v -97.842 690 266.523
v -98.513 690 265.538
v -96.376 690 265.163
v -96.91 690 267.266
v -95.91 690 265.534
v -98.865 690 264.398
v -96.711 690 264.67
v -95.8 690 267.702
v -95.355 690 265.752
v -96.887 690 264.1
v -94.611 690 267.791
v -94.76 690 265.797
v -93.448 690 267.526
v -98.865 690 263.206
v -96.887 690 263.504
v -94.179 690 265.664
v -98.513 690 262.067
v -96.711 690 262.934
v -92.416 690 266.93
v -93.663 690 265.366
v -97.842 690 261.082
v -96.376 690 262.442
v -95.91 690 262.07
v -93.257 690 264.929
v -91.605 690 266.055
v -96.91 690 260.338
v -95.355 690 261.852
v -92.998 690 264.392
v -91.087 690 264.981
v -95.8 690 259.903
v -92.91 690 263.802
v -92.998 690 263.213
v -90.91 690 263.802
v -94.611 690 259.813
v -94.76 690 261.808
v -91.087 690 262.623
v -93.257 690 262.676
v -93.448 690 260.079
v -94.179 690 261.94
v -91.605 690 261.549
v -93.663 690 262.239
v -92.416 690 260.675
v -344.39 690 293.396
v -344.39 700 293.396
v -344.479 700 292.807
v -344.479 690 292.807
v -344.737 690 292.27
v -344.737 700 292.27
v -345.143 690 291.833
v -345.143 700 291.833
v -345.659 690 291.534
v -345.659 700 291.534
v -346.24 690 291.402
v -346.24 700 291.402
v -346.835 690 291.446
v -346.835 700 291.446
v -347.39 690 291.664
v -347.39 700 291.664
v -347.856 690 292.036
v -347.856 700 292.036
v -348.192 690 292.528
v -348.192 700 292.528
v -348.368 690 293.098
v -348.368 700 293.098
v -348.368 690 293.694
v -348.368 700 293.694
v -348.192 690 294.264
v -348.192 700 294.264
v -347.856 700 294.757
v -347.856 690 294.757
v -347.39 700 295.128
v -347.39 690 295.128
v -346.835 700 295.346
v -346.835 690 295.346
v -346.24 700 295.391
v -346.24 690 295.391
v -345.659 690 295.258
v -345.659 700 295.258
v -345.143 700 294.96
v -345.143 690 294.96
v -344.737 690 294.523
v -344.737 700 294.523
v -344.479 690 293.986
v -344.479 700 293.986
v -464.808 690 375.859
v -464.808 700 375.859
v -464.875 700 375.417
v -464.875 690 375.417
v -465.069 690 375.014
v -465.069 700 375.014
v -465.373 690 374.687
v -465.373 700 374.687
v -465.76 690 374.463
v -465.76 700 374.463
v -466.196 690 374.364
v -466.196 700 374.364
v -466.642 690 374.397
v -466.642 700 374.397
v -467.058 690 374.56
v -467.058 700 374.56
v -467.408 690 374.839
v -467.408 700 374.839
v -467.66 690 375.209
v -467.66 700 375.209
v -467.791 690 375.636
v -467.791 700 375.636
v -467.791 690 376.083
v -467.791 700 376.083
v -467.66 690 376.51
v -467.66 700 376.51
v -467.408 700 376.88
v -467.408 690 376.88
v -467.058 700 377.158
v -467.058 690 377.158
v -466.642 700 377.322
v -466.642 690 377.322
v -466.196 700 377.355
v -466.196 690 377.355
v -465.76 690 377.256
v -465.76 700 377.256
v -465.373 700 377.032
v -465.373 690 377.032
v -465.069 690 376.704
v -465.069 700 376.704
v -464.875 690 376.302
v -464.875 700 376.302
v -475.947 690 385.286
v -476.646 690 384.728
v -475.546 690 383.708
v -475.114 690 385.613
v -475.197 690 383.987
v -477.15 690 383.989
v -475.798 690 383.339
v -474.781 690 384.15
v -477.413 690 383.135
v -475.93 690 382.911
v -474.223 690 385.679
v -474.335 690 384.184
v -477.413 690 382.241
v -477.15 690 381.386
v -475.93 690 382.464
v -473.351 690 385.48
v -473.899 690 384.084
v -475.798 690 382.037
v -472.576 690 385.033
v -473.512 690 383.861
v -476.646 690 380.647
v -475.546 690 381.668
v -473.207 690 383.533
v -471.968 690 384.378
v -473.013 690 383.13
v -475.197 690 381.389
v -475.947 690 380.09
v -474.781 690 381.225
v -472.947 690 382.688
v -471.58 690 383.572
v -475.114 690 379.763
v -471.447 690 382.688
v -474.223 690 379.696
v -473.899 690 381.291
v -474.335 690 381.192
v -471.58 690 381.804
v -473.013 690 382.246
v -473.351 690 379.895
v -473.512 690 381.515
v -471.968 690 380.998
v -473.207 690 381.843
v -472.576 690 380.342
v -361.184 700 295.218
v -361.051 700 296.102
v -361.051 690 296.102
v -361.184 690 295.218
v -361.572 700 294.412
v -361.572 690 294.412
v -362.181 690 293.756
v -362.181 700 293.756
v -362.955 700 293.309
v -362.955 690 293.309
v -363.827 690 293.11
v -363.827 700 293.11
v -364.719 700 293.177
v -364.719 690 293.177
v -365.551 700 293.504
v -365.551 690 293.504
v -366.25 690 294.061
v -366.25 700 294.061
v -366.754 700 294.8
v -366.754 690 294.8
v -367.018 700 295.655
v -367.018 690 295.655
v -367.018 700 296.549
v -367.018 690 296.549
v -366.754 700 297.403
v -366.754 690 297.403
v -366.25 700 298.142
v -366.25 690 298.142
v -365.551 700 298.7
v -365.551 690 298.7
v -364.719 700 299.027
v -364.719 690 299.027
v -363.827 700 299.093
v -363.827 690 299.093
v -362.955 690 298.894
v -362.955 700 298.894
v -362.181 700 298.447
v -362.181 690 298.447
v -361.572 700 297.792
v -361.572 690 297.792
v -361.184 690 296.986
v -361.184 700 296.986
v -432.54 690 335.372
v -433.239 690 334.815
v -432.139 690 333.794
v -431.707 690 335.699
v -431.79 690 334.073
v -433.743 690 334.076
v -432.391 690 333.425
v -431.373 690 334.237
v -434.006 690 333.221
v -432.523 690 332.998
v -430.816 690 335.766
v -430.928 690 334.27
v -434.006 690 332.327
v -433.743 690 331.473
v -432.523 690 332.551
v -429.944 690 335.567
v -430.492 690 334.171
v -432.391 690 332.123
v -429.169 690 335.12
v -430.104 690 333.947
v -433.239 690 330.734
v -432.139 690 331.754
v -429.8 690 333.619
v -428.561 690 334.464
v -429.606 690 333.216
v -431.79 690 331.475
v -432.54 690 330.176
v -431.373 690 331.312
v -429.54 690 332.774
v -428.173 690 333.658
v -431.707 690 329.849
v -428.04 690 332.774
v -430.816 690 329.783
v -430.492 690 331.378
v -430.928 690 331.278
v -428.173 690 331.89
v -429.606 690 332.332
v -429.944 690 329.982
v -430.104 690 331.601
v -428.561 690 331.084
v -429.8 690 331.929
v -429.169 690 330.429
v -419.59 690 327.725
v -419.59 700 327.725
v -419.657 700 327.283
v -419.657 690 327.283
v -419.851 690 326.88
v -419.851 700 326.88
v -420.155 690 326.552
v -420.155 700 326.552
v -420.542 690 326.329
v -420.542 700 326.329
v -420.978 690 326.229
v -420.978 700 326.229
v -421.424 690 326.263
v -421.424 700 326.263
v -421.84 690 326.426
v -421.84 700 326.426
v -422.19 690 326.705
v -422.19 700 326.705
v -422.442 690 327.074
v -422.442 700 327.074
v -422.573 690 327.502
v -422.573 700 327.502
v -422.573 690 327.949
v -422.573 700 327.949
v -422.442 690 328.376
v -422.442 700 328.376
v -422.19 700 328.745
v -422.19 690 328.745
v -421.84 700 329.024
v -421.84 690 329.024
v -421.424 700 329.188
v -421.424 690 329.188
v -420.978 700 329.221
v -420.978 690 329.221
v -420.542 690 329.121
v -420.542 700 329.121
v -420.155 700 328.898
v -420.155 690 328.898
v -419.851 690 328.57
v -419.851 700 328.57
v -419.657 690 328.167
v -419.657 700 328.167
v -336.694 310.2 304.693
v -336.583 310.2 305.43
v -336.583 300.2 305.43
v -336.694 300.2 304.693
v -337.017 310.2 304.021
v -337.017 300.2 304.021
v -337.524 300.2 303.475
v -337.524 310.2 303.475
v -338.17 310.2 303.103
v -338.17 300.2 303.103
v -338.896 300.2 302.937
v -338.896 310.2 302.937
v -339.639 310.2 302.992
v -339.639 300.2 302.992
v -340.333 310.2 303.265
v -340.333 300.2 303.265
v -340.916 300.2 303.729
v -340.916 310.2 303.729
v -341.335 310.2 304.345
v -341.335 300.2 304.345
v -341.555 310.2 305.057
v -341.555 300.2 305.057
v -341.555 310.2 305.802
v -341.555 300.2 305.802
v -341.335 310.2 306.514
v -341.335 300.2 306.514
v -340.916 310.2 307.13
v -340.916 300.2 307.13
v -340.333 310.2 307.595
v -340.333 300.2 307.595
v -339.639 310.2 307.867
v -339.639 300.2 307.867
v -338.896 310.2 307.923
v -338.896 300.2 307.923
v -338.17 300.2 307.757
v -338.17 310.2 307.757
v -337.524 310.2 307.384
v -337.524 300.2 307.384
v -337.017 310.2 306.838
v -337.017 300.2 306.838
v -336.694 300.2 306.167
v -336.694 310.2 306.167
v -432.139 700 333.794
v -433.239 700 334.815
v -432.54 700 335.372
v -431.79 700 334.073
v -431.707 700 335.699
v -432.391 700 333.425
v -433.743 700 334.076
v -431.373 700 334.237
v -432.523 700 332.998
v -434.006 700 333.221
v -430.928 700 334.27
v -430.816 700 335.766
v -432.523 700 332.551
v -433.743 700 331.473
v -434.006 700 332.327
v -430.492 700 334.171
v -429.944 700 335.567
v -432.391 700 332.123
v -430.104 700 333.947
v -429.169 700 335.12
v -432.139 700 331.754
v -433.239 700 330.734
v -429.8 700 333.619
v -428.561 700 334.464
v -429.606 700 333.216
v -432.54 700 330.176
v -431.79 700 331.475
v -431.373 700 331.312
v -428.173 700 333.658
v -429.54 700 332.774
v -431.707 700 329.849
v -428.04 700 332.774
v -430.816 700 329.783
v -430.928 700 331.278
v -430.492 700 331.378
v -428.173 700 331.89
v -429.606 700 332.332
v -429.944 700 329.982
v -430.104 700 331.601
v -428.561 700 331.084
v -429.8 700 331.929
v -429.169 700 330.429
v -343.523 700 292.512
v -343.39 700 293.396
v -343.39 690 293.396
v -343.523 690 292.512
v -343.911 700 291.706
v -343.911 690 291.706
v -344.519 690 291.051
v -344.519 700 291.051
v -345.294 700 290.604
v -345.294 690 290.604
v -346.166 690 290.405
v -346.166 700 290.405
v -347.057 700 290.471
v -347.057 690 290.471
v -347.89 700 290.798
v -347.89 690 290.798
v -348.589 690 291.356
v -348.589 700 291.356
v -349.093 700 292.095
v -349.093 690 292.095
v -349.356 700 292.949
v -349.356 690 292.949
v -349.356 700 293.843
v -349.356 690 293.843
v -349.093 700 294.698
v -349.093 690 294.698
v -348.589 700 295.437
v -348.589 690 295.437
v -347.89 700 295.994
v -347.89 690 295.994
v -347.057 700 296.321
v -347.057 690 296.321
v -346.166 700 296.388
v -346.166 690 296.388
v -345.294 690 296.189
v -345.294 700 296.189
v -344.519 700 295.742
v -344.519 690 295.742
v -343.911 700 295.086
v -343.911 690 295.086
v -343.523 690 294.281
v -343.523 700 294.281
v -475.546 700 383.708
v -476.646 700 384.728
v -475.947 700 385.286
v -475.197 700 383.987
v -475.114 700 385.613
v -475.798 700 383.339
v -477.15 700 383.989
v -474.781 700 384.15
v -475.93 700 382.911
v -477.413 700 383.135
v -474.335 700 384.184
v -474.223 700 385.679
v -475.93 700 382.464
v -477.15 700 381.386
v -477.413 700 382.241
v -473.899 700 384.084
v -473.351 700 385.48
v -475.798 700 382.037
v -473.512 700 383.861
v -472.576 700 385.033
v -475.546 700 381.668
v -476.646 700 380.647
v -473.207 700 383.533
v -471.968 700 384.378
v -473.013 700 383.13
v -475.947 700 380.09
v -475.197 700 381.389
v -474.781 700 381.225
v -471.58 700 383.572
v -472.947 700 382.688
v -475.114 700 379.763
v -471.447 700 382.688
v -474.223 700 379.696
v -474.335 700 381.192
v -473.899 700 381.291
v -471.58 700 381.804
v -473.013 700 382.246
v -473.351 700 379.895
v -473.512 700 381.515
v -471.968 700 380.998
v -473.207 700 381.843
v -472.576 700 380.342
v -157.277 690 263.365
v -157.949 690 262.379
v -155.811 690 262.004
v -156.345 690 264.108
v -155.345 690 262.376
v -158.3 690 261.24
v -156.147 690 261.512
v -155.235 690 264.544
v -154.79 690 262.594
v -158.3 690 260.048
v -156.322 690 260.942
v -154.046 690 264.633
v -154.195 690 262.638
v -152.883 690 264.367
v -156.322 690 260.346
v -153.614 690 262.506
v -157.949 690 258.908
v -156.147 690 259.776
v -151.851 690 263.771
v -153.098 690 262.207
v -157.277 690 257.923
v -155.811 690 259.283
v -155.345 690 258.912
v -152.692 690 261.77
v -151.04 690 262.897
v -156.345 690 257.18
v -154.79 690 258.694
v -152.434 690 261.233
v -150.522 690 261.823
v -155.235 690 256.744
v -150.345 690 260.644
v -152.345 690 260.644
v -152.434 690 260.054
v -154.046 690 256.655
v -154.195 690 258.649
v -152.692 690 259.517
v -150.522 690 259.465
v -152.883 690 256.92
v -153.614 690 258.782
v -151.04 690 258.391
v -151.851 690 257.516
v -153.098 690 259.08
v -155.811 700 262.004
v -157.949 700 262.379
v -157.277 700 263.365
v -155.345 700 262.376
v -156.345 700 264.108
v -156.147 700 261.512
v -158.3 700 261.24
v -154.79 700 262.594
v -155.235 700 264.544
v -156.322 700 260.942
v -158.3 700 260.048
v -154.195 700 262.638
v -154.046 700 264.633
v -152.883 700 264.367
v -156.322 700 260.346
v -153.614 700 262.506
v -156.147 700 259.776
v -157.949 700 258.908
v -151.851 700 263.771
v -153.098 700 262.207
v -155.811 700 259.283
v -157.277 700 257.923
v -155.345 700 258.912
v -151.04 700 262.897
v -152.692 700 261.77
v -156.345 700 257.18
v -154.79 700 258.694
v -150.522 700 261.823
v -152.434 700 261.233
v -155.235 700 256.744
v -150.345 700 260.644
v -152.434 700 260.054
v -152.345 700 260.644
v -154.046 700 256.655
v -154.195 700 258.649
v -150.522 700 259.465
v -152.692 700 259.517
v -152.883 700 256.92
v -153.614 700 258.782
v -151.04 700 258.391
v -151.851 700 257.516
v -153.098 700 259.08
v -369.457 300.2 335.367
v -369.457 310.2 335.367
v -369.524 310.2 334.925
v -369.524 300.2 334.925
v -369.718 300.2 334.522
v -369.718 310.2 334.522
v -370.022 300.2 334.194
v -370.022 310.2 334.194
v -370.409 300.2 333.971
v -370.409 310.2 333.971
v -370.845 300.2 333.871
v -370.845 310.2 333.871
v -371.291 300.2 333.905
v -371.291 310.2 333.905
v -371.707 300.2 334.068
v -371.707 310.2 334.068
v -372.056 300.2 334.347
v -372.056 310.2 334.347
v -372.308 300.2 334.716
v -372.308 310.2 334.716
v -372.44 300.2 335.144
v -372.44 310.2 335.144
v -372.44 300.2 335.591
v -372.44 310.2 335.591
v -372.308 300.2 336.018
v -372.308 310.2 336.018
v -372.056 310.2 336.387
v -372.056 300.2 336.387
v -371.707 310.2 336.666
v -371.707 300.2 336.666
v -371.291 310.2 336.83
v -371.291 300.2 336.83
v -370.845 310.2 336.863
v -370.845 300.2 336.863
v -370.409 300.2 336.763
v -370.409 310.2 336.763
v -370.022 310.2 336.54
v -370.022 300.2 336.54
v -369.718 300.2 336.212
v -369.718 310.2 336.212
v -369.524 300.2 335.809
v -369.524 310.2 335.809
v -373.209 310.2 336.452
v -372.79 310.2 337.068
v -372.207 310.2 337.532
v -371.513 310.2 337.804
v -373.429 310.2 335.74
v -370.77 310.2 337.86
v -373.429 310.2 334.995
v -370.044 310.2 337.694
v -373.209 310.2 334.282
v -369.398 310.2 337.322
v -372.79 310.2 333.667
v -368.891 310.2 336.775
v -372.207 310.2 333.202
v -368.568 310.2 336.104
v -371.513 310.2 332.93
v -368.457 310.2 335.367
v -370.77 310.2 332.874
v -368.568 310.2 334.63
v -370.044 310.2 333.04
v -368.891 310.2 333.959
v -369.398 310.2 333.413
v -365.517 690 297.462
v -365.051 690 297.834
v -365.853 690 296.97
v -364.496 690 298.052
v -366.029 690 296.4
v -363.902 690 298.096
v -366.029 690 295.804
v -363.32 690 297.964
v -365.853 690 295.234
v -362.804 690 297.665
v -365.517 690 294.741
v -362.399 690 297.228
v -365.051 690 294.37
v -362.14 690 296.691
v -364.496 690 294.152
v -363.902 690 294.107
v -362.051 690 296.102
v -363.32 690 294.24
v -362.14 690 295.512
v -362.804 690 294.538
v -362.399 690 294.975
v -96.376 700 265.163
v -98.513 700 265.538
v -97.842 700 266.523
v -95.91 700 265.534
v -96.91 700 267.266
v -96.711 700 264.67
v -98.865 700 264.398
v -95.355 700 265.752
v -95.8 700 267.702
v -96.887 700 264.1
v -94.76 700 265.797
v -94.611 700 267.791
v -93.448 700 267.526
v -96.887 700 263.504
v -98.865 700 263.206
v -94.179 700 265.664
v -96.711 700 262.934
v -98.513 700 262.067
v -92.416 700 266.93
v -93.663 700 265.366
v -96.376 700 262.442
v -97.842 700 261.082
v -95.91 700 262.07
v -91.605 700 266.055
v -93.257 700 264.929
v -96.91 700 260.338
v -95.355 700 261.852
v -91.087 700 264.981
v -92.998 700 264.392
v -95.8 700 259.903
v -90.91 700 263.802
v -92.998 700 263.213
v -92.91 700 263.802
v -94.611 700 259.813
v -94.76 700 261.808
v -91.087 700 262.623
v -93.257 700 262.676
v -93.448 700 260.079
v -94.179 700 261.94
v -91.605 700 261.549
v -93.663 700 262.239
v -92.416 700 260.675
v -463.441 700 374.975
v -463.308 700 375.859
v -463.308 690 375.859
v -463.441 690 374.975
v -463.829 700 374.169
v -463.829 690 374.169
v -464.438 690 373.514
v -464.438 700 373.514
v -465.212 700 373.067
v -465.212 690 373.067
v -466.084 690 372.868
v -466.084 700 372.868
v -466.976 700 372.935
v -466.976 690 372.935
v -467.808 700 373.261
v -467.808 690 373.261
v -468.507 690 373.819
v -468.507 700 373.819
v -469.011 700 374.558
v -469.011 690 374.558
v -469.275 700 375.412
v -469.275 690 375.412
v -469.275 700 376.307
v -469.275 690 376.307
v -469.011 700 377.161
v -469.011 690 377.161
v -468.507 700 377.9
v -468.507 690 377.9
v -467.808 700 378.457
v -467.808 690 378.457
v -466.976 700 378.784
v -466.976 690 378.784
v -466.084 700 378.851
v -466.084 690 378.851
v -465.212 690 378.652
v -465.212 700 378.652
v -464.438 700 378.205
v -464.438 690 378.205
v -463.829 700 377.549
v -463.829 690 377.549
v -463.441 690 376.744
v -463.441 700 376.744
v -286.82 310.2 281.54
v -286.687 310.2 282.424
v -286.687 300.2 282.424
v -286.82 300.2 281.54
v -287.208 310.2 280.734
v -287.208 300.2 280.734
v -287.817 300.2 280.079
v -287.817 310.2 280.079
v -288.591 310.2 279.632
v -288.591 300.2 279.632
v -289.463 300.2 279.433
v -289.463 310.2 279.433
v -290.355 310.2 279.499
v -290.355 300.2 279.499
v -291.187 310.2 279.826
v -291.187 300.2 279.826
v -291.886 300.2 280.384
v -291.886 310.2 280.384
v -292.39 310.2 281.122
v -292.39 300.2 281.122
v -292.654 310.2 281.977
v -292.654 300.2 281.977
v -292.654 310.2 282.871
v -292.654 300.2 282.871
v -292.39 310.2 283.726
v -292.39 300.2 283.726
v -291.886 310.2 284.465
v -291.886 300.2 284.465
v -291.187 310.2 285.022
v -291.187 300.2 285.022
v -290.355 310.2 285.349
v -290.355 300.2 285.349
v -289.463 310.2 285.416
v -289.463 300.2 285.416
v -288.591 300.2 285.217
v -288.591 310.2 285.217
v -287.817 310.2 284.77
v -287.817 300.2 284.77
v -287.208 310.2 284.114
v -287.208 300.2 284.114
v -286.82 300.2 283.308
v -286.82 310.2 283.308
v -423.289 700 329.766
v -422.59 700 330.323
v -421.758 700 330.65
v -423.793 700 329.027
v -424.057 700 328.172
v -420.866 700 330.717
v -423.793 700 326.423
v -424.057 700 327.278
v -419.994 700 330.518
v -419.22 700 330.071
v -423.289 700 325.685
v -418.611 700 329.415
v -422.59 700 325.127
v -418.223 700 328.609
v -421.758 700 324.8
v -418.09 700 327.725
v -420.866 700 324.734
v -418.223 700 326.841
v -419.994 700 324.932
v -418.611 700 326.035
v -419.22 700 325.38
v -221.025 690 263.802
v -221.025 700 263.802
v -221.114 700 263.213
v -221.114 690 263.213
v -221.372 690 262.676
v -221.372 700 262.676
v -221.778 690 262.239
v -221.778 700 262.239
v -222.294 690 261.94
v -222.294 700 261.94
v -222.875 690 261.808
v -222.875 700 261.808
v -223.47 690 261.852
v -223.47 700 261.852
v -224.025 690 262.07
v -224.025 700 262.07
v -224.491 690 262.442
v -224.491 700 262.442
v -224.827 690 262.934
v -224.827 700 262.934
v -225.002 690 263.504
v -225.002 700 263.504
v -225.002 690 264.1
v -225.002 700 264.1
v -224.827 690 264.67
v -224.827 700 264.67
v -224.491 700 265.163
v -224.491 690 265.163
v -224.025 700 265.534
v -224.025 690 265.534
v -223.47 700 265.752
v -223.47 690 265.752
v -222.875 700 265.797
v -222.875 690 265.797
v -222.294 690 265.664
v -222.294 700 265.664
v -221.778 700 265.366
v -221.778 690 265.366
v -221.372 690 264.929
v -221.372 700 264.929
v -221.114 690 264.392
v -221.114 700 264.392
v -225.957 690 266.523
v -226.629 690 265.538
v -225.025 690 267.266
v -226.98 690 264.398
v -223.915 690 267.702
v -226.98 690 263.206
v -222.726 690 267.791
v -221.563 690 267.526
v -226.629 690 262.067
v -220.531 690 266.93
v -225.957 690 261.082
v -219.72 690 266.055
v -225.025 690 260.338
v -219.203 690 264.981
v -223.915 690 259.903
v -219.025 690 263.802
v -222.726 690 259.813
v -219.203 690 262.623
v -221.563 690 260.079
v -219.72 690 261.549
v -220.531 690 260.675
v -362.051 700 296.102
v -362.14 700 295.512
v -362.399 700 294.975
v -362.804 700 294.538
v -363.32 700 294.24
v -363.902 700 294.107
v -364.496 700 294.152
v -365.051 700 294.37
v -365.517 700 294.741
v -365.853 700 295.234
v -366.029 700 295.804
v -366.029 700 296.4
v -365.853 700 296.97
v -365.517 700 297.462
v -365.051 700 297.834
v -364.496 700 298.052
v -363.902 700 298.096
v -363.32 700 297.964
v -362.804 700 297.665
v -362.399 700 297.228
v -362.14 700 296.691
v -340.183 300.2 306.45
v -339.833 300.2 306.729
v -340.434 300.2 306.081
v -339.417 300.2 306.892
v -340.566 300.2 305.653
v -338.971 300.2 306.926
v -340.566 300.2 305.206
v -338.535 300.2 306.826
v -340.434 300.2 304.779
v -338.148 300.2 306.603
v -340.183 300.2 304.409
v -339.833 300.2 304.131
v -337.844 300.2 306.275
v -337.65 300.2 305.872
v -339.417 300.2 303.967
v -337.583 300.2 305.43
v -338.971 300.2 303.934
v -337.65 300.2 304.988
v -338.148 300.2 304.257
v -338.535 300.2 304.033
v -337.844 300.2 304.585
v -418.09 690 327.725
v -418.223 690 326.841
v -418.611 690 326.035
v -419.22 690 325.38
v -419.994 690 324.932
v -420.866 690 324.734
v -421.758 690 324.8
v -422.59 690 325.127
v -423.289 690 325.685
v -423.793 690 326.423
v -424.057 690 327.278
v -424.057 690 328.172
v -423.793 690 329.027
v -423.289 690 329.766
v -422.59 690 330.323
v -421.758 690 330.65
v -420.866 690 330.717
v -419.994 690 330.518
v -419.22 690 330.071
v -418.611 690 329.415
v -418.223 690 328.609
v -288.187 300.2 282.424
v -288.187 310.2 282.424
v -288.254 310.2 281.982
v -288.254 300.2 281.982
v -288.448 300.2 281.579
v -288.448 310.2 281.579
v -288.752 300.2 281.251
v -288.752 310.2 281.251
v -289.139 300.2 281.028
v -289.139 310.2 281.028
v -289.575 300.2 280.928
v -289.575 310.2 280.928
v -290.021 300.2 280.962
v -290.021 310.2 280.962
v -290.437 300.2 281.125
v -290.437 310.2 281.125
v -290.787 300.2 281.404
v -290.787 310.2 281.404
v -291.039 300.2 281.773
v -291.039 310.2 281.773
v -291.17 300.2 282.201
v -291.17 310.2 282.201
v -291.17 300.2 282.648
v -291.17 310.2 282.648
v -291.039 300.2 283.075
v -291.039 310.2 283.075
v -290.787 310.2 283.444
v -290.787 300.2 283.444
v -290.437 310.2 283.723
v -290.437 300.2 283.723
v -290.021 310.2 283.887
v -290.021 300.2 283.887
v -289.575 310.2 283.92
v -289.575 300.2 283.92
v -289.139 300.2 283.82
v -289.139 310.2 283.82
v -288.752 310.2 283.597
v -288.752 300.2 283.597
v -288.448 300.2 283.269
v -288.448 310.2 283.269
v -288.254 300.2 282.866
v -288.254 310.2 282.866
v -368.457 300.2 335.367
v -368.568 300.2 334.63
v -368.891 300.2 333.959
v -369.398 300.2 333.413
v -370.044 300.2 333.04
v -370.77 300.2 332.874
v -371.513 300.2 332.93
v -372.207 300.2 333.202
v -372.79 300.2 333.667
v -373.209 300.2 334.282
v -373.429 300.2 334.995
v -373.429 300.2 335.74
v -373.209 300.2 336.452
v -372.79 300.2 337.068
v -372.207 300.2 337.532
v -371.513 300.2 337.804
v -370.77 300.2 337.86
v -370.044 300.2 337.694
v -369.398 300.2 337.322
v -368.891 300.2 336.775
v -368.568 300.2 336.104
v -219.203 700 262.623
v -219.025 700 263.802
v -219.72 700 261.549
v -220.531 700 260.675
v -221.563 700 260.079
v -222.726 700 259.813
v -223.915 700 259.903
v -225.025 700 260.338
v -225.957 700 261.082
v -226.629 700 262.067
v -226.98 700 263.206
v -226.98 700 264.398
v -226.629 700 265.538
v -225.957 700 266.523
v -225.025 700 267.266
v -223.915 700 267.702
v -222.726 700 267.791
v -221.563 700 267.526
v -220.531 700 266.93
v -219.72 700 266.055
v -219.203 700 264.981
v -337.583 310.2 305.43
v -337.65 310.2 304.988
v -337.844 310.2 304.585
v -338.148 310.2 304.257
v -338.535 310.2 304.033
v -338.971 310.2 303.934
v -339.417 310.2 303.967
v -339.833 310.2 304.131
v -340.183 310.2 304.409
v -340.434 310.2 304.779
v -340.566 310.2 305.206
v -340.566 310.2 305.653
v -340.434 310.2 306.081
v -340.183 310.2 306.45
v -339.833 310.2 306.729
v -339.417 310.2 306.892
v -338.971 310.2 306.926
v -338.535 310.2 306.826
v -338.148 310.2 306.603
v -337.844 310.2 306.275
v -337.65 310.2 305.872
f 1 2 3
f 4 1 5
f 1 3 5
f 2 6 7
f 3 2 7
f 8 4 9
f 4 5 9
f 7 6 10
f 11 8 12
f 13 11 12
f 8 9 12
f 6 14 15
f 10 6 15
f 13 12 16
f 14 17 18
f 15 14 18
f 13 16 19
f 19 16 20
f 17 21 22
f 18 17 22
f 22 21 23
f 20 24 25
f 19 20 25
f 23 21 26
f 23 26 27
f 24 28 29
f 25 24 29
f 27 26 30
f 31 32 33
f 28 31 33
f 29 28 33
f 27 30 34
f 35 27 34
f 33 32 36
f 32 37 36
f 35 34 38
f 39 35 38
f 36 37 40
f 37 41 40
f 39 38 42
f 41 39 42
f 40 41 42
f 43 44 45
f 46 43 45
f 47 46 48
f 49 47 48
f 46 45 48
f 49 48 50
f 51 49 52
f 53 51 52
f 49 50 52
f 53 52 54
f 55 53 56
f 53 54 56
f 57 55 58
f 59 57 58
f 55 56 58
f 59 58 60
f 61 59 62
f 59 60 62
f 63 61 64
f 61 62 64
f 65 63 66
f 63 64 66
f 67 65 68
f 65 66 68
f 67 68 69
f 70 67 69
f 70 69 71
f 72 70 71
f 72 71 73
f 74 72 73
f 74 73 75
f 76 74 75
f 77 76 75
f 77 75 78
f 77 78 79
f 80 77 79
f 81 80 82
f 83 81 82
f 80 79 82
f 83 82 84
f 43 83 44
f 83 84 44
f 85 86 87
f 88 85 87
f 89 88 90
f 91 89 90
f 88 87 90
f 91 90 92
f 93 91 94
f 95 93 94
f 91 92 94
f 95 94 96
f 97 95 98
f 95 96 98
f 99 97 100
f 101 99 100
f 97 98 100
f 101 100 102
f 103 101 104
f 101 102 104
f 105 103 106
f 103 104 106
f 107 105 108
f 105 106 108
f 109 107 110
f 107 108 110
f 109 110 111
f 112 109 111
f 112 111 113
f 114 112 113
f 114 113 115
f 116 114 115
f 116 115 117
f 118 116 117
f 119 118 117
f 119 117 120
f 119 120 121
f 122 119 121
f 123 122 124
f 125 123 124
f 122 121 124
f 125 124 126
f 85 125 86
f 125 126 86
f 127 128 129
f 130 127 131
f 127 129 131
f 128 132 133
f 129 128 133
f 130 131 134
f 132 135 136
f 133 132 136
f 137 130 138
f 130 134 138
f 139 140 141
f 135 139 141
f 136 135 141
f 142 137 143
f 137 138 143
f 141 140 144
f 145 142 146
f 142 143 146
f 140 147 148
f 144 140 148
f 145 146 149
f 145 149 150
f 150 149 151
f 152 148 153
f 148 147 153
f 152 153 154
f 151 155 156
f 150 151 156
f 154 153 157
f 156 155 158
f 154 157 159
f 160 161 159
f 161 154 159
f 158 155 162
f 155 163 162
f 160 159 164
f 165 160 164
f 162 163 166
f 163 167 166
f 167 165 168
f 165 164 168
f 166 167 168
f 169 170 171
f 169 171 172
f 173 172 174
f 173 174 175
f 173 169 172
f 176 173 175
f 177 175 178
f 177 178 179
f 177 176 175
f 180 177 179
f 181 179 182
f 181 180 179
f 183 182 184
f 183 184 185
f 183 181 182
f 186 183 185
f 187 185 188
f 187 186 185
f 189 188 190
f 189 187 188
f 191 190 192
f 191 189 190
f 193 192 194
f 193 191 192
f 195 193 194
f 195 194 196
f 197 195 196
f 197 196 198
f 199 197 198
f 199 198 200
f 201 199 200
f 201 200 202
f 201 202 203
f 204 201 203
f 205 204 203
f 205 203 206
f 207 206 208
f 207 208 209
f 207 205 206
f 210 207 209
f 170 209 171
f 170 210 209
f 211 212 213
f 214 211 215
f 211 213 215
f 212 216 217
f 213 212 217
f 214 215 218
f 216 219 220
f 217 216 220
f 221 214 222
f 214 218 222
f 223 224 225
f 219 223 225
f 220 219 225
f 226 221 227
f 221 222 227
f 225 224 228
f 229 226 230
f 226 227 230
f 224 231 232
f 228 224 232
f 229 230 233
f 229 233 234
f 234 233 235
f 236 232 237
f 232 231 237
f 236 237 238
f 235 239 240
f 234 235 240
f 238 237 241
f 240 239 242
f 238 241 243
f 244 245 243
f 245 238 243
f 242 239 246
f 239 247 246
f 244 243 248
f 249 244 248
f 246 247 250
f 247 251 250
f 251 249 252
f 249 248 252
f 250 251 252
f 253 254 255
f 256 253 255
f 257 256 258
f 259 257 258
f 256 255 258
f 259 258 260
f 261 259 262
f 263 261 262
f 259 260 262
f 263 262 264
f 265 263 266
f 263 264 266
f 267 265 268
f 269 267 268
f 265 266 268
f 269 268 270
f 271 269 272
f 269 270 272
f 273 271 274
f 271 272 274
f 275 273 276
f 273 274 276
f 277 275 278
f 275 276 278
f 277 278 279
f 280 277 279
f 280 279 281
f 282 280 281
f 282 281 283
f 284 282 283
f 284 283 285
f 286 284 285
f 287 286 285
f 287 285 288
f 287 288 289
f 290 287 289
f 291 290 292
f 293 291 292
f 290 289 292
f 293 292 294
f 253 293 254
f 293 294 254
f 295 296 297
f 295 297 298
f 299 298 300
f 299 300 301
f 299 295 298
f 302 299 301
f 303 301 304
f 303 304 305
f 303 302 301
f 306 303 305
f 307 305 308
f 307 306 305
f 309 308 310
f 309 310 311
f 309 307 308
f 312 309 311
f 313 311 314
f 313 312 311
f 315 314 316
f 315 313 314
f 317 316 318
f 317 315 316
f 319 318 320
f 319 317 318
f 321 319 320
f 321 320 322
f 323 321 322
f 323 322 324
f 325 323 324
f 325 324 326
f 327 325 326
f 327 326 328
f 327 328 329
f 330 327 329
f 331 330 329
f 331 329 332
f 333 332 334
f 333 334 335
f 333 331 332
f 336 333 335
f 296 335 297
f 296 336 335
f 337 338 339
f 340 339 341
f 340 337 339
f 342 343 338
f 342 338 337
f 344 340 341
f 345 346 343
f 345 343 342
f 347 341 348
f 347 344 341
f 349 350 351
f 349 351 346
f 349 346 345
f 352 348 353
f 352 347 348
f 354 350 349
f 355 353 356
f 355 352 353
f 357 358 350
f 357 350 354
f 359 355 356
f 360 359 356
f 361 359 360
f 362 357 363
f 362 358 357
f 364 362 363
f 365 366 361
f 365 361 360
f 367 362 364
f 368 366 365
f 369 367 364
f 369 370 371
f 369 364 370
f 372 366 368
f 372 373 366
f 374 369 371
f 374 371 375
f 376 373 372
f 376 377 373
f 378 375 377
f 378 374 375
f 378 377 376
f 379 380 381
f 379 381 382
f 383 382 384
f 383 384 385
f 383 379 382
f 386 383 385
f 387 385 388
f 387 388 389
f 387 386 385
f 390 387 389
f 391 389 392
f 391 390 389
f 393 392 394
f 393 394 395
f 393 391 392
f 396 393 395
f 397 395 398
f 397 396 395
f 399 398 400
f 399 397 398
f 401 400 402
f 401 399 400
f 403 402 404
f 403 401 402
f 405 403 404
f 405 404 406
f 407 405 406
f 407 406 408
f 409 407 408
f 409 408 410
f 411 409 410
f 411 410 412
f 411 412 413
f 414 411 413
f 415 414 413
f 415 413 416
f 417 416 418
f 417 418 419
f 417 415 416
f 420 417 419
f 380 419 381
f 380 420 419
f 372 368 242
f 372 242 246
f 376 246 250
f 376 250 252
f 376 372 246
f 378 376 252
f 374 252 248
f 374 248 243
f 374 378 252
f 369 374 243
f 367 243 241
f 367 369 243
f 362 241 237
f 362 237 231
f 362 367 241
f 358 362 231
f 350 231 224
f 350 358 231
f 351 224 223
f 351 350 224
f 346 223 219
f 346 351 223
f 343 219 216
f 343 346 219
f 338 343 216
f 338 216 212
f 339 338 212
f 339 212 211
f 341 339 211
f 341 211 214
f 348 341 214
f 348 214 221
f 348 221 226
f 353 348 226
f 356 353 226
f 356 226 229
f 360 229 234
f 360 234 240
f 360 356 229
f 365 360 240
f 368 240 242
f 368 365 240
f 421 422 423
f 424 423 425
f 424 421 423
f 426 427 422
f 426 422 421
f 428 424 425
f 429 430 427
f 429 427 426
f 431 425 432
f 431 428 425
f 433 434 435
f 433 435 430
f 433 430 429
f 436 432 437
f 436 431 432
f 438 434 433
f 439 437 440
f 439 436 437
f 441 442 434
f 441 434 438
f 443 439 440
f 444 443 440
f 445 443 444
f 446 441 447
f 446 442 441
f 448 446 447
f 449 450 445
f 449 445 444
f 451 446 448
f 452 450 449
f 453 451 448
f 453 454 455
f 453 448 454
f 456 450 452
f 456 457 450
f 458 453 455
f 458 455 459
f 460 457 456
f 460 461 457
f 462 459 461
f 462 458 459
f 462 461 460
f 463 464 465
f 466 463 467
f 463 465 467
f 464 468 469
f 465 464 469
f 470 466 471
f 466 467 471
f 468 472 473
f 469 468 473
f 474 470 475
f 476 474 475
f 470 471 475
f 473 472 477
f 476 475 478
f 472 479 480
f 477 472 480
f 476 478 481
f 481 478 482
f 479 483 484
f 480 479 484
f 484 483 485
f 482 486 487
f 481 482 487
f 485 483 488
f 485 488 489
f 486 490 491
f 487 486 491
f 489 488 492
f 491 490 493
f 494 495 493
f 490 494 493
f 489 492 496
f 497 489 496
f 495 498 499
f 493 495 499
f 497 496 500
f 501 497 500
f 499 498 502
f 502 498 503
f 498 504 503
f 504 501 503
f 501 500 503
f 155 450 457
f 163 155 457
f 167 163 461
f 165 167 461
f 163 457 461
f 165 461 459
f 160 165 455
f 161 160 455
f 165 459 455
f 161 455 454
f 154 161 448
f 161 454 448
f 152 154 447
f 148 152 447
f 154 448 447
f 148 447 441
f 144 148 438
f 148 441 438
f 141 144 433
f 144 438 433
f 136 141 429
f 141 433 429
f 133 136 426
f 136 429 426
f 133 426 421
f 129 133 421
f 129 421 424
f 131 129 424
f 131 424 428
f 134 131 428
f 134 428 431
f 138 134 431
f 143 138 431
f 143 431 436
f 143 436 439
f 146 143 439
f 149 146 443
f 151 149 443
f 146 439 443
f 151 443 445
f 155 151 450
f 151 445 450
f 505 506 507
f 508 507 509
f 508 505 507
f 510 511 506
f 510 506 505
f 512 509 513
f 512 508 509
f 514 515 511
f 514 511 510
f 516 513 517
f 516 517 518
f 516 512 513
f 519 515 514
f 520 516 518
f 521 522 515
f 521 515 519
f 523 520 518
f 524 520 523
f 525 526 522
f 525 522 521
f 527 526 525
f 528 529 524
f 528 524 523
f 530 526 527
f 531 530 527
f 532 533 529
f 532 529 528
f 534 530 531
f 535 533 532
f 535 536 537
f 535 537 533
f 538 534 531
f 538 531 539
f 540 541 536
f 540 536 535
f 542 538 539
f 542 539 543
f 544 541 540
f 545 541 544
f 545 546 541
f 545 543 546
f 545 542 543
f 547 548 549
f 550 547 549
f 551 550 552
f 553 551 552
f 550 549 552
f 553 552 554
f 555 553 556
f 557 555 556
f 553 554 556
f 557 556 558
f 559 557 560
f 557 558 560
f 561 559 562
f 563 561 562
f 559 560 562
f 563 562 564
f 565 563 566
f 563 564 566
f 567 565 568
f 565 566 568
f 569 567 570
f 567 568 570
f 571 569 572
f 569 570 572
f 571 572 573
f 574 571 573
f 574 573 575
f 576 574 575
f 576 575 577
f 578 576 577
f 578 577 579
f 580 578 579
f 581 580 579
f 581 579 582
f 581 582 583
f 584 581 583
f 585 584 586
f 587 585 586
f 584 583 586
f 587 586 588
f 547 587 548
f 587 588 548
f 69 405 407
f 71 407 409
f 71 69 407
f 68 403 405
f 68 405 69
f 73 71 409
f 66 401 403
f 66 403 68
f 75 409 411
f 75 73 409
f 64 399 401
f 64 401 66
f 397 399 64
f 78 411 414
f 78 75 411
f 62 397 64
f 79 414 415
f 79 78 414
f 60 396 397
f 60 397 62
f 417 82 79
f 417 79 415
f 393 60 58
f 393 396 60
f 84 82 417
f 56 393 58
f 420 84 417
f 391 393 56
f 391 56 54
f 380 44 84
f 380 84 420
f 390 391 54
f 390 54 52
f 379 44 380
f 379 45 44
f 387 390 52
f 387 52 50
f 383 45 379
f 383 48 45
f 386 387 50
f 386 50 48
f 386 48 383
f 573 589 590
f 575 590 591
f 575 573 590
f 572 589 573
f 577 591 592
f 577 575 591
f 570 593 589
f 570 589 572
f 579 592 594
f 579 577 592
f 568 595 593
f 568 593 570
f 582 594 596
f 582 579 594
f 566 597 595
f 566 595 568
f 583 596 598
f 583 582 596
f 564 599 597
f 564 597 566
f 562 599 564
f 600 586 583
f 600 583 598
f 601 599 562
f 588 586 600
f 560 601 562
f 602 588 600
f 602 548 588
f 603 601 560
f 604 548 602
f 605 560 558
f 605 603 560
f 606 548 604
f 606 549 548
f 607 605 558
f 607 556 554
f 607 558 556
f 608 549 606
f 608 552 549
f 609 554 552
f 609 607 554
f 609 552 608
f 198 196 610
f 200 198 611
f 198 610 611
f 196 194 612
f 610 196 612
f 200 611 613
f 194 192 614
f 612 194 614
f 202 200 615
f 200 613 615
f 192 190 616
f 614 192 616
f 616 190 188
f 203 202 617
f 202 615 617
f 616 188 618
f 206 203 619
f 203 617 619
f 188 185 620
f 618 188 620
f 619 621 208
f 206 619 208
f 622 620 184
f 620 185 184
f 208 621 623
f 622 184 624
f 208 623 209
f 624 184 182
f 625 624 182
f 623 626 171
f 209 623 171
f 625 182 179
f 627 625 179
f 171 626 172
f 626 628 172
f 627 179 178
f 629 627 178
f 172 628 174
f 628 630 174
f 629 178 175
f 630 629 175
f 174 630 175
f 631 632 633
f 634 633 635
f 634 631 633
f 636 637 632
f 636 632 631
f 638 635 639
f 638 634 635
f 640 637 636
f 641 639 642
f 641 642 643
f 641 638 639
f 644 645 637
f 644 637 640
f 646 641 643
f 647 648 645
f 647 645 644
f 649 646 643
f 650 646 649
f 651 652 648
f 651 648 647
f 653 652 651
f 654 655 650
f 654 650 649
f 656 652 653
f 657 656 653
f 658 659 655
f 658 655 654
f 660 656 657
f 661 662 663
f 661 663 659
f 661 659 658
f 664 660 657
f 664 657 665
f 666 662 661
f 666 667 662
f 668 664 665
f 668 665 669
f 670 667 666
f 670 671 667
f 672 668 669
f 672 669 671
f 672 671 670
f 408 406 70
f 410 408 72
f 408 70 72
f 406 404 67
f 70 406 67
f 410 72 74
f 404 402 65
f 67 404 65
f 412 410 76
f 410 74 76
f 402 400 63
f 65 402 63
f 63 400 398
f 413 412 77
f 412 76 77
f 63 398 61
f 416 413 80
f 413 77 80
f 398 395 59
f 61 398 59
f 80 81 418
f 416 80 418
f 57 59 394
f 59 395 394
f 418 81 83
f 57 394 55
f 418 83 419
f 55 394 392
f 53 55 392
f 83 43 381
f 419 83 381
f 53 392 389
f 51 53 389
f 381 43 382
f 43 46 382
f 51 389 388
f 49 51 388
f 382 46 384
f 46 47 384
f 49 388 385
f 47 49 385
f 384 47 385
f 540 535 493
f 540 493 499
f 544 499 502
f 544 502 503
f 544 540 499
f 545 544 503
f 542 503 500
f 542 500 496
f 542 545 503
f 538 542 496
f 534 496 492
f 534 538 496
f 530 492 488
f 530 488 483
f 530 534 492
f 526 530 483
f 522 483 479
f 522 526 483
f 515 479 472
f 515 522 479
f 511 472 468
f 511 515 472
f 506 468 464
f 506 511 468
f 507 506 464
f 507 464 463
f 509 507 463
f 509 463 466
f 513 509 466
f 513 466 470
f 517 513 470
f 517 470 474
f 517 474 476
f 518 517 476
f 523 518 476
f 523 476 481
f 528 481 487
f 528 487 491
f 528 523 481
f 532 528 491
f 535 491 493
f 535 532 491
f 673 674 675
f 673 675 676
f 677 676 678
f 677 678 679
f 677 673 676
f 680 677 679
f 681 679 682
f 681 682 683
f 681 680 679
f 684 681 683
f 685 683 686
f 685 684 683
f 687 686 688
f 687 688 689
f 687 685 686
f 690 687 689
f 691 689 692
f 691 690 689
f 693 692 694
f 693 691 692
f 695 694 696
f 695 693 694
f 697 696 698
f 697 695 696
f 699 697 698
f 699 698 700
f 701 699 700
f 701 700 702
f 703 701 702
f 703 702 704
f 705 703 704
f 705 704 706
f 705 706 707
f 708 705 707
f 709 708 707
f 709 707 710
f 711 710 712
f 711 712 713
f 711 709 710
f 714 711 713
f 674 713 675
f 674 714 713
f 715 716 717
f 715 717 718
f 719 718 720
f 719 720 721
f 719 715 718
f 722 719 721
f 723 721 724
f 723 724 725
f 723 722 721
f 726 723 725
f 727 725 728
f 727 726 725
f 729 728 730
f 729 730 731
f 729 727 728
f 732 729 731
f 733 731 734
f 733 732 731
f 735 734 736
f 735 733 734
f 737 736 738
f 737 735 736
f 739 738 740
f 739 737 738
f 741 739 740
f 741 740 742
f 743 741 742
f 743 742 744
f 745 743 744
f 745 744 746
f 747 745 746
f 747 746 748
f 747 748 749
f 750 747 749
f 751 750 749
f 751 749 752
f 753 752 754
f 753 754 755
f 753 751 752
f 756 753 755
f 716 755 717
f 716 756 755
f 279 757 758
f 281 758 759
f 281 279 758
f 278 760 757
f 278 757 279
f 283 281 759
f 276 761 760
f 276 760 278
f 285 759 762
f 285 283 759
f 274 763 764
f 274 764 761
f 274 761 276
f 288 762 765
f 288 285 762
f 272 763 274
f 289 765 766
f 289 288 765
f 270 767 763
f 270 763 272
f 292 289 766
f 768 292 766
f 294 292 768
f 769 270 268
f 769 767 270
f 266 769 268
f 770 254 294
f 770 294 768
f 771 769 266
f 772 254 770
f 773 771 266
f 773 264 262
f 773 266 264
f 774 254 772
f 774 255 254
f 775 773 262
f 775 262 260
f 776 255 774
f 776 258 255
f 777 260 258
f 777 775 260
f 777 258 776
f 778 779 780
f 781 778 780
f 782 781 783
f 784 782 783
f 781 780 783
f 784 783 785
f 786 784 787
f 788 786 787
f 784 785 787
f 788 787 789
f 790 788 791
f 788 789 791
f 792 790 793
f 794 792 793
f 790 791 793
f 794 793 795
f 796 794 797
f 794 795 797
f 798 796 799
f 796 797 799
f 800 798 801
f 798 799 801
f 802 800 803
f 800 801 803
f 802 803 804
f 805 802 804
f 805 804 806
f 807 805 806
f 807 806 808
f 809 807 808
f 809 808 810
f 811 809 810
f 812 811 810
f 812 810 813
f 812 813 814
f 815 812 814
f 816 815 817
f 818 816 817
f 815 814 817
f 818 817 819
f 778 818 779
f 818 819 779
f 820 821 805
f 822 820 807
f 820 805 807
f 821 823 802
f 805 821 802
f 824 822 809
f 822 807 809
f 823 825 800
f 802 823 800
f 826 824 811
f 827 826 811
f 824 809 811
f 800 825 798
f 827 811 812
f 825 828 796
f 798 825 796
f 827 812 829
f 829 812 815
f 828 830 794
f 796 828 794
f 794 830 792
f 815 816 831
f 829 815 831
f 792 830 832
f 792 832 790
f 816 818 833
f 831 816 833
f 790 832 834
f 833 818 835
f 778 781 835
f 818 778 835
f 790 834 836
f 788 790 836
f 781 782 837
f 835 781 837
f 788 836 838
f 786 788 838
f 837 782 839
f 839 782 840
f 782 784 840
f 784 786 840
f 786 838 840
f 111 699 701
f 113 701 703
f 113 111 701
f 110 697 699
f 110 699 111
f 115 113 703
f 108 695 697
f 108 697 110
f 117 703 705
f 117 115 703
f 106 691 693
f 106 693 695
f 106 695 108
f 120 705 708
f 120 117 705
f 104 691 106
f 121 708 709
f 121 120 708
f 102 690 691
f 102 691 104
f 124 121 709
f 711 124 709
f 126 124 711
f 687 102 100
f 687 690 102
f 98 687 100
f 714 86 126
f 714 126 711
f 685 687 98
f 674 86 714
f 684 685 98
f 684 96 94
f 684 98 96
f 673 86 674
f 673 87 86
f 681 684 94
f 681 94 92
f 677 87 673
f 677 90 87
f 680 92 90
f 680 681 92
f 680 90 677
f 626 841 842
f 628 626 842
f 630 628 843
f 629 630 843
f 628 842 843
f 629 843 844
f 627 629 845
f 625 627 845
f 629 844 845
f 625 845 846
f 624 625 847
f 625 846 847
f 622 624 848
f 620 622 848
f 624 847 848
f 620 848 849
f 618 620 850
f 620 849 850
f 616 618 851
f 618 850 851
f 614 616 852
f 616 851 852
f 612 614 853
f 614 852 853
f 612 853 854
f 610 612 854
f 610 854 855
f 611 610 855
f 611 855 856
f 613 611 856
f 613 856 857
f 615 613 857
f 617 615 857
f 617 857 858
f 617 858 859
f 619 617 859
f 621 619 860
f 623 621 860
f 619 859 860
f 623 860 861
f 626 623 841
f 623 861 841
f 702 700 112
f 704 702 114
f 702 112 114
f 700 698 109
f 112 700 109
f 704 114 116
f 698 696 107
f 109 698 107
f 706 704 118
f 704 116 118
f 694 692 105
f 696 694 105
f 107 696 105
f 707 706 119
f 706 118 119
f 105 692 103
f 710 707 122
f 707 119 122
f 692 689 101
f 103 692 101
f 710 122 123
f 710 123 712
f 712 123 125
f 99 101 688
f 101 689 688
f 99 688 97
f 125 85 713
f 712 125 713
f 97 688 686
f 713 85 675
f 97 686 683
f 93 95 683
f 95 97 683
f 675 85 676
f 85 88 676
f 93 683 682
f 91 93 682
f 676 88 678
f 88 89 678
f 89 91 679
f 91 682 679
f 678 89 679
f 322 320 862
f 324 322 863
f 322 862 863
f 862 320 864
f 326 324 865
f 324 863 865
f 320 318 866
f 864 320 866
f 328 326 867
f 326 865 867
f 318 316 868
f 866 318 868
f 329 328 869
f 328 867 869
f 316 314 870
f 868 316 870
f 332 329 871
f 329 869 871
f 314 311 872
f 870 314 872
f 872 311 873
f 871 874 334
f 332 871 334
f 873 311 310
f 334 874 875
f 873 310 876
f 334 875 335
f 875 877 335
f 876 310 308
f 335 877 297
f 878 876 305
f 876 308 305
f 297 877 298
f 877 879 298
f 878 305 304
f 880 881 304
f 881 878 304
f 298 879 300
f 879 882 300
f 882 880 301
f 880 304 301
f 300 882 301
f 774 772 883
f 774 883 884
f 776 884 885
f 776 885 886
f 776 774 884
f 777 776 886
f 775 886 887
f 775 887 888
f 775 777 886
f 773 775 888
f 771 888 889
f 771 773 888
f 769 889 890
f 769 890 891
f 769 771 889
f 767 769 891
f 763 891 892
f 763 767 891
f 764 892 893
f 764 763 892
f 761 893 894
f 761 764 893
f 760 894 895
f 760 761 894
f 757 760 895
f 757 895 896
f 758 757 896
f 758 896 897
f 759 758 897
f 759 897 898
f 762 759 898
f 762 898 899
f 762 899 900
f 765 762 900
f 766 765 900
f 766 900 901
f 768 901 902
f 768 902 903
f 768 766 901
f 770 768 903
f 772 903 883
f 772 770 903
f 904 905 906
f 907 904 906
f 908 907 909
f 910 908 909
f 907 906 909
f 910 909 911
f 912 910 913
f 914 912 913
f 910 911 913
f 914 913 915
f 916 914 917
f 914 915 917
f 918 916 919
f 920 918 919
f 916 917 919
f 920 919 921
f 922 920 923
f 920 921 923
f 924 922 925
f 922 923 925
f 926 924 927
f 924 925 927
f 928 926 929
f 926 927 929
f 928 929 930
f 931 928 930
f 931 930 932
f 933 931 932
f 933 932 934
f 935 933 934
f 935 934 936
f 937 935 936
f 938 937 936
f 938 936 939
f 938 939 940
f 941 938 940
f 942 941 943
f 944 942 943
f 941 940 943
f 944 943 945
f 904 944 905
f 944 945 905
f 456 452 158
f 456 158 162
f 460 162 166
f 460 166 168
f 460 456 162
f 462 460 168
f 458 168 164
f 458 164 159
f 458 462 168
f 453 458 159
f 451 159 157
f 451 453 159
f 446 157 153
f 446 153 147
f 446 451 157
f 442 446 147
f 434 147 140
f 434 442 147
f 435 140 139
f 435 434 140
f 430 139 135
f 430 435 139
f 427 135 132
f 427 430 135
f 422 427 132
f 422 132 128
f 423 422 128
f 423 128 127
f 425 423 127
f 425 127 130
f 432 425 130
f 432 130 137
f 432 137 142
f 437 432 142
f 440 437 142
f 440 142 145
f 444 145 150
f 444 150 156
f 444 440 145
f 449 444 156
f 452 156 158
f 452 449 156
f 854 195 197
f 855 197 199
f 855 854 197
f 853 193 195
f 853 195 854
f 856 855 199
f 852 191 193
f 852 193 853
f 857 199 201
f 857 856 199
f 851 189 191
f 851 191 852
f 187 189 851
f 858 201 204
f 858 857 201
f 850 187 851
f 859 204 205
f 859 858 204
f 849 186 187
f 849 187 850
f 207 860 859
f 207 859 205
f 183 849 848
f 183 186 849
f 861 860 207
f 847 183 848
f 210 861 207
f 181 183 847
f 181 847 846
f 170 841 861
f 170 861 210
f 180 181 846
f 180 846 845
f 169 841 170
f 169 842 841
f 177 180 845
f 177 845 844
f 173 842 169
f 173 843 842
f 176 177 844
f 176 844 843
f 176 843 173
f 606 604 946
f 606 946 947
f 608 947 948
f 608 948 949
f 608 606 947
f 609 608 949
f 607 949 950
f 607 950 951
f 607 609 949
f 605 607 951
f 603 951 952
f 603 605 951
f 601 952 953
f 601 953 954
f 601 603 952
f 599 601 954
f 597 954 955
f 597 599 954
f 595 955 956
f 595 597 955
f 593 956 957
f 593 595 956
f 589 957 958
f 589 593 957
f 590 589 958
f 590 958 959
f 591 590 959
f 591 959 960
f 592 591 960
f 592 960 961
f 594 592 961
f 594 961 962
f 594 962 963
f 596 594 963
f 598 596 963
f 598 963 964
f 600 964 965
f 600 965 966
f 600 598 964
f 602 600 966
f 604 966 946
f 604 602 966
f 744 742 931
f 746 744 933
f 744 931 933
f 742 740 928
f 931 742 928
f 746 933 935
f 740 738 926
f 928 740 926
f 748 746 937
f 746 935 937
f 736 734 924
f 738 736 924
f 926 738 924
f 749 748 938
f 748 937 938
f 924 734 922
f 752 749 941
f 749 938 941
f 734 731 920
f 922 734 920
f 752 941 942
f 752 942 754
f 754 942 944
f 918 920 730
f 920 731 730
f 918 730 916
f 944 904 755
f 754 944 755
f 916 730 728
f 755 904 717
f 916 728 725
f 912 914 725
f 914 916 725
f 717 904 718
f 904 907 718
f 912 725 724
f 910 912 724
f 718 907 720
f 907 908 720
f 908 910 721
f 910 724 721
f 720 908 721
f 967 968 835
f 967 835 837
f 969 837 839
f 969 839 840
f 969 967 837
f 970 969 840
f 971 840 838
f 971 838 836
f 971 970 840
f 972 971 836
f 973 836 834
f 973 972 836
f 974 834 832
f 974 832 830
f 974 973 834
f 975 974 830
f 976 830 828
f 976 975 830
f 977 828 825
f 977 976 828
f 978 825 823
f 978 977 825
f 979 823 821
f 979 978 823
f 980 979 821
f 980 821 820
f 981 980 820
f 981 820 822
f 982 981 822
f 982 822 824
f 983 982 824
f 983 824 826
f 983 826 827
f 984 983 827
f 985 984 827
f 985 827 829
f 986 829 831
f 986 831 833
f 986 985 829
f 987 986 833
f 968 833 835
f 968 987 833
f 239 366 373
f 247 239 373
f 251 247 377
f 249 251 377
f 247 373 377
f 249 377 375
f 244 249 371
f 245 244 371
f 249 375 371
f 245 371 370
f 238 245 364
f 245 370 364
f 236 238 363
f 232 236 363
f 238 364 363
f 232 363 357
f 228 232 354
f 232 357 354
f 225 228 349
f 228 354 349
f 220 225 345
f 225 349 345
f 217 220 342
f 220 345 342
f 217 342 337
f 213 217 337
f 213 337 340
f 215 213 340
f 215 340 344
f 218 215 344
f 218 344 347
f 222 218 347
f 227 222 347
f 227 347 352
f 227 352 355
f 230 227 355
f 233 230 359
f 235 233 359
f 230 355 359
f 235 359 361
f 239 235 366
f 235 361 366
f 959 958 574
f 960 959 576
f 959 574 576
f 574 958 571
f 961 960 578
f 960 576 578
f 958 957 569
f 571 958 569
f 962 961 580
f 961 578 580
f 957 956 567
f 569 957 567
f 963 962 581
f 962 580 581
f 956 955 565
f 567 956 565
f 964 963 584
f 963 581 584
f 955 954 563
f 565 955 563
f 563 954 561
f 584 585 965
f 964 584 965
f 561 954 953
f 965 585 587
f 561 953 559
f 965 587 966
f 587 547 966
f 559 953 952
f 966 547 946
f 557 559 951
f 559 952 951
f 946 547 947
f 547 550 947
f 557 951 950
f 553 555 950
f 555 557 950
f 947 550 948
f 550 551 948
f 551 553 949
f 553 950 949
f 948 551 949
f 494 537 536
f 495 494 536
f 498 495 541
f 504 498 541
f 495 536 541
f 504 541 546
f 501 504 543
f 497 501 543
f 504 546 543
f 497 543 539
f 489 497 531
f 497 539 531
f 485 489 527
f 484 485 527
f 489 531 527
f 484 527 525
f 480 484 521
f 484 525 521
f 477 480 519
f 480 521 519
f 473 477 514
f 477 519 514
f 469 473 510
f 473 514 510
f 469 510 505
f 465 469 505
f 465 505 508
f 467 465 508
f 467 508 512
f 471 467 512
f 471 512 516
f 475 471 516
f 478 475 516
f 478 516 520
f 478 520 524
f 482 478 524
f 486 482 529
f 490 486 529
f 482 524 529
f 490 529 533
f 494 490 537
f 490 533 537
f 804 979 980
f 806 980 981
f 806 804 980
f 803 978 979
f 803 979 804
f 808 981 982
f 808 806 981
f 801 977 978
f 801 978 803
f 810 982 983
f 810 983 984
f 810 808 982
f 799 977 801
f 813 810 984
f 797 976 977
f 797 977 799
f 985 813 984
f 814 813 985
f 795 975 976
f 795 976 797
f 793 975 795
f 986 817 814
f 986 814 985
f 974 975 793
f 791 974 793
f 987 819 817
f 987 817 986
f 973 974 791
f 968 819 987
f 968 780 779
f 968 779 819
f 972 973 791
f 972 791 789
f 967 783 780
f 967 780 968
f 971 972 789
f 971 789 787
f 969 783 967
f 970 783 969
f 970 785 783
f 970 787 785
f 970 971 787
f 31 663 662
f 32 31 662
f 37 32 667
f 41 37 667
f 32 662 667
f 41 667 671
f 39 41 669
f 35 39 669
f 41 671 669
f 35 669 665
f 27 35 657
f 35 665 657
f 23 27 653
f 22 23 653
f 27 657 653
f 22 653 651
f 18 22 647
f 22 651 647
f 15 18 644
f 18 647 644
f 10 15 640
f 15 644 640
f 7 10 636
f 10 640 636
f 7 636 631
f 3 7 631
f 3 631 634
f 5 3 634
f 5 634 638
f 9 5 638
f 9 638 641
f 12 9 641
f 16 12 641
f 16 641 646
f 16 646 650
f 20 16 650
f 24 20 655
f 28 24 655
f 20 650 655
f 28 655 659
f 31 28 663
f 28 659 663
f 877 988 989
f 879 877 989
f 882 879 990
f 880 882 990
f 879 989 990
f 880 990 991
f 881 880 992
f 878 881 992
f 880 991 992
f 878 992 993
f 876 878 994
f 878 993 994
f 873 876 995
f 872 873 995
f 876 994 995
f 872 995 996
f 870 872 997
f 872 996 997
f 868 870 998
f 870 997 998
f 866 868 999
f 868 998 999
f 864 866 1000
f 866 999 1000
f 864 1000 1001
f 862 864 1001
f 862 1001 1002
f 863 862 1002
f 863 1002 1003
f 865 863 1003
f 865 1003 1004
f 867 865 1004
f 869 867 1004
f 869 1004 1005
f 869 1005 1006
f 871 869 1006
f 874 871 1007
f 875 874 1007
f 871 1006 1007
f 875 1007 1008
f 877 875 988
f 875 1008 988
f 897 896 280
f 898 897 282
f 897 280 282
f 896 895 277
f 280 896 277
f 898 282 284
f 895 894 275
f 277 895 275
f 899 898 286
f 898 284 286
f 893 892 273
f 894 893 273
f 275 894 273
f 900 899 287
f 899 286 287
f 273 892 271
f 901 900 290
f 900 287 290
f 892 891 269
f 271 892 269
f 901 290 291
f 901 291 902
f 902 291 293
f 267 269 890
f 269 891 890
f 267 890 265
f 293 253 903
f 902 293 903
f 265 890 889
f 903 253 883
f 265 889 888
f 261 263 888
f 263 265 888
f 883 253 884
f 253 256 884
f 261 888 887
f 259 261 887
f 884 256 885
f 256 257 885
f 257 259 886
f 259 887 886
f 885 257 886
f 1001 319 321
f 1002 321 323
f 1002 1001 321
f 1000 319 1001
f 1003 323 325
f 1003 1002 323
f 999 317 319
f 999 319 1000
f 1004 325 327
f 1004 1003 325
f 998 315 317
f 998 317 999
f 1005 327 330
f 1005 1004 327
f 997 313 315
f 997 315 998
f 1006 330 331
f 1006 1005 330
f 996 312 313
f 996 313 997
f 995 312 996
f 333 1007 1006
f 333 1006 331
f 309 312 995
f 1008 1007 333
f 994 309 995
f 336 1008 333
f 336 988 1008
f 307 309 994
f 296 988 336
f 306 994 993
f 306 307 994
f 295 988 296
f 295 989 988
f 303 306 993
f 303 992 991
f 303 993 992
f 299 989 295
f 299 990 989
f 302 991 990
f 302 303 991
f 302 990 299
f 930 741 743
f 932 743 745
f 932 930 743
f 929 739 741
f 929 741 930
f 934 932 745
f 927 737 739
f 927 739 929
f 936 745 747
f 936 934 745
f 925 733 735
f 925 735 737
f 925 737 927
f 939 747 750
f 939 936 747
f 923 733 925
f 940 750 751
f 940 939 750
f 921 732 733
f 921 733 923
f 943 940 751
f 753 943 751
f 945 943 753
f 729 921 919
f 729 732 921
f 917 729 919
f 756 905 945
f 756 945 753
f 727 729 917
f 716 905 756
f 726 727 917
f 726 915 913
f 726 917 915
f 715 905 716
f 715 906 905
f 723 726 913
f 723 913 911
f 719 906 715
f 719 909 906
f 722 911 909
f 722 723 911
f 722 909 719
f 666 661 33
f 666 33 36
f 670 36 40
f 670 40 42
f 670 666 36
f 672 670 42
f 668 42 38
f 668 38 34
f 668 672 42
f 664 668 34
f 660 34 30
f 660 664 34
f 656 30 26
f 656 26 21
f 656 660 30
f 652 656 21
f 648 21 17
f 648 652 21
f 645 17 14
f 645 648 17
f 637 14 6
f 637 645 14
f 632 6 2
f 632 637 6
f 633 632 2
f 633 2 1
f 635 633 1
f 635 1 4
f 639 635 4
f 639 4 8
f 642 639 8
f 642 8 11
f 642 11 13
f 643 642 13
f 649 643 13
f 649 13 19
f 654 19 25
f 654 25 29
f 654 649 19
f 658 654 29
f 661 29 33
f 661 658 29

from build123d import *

# Parameters (mm, degrees)
SZKIC1_R                      = 3
SZKIC1_R_2                    = 1.5
DODANIE_WYCI_GNI_CIE1_DEPTH   = 10
DODANIE_WYCI_GNI_CIE1_2_DEPTH = 10
DODANIE_WYCI_GNI_CIE1_3_DEPTH = 10
DODANIE_WYCI_GNI_CIE1_4_DEPTH = 10
SZKIC1_R_3                    = 2
DODANIE_WYCI_GNI_CIE1_5_DEPTH = 10
DODANIE_WYCI_GNI_CIE1_6_DEPTH = 10
SZKIC1_R_4                    = 4
DODANIE_WYCI_GNI_CIE1_7_DEPTH = 10
DODANIE_WYCI_GNI_CIE1_8_DEPTH = 10
DODANIE_WYCI_GNI_CIE1_9_DEPTH = 10
SZKIC2_R                      = 2.5
SZKIC2_R_2                    = 1.5
DODANIE_WYCI_GNI_CIE2_DEPTH   = 10
DODANIE_WYCI_GNI_CIE2_2_DEPTH = 10
SZKIC2_R_3                    = 3
DODANIE_WYCI_GNI_CIE2_3_DEPTH = 10


with BuildPart() as part:
    # Szkic1 → Dodanie-wyciągnięcie1 (new body)
    with BuildSketch(Plane(origin=(0, 700, 0), x_dir=(1, 0, 0), z_dir=(0, 1, 0))):
        with Locations((-474.446759549, -382.68779999)):
            Circle(SZKIC1_R)
        with Locations((-474.446759549, -382.68779999)):
            Circle(SZKIC1_R_2, mode=Mode.SUBTRACT)
    extrude(amount=-DODANIE_WYCI_GNI_CIE1_DEPTH)


with BuildPart() as body_2:
    # Szkic1 → Dodanie-wyci_gni_cie1 2 (new body)
    with BuildSketch(Plane(origin=(0, 700, 0), x_dir=(1, 0, 0), z_dir=(0, 1, 0))):
        with Locations((-466.308050674, -375.85941501)):
            Circle(SZKIC1_R)
        with Locations((-466.308050674, -375.85941501)):
            Circle(SZKIC1_R_2, mode=Mode.SUBTRACT)
    extrude(amount=-DODANIE_WYCI_GNI_CIE1_2_DEPTH)


with BuildPart() as body_3:
    # Szkic1 → Dodanie-wyci_gni_cie1 3 (new body)
    with BuildSketch(Plane(origin=(0, 700, 0), x_dir=(1, 0, 0), z_dir=(0, 1, 0))):
        with Locations((-431.039698402, -332.774189517)):
            Circle(SZKIC1_R)
        with Locations((-431.039698402, -332.774189517)):
            Circle(SZKIC1_R_2, mode=Mode.SUBTRACT)
    extrude(amount=-DODANIE_WYCI_GNI_CIE1_3_DEPTH)


with BuildPart() as body_4:
    # Szkic1 → Dodanie-wyci_gni_cie1 4 (new body)
    with BuildSketch(Plane(origin=(0, 700, 0), x_dir=(1, 0, 0), z_dir=(0, 1, 0))):
        with Locations((-421.090050281, -327.725114352)):
            Circle(SZKIC1_R)
        with Locations((-421.090050281, -327.725114352)):
            Circle(SZKIC1_R_2, mode=Mode.SUBTRACT)
    extrude(amount=-DODANIE_WYCI_GNI_CIE1_4_DEPTH)


with BuildPart() as body_5:
    # Szkic1 → Dodanie-wyci_gni_cie1 5 (new body)
    with BuildSketch(Plane(origin=(0, 700, 0), x_dir=(1, 0, 0), z_dir=(0, 1, 0))):
        with Locations((-364.051137421, -296.101801859)):
            Circle(SZKIC1_R)
        with Locations((-364.051137421, -296.101801859)):
            Circle(SZKIC1_R_3, mode=Mode.SUBTRACT)
    extrude(amount=-DODANIE_WYCI_GNI_CIE1_5_DEPTH)


with BuildPart() as body_6:
    # Szkic1 → Dodanie-wyci_gni_cie1 6 (new body)
    with BuildSketch(Plane(origin=(0, 700, 0), x_dir=(1, 0, 0), z_dir=(0, 1, 0))):
        with Locations((-346.389872513, -293.396246383)):
            Circle(SZKIC1_R)
        with Locations((-346.389872513, -293.396246383)):
            Circle(SZKIC1_R_3, mode=Mode.SUBTRACT)
    extrude(amount=-DODANIE_WYCI_GNI_CIE1_6_DEPTH)


with BuildPart() as body_7:
    # Szkic1 → Dodanie-wyci_gni_cie1 7 (new body)
    with BuildSketch(Plane(origin=(0, 700, 0), x_dir=(1, 0, 0), z_dir=(0, 1, 0))):
        with Locations((-223.024834581, -263.802212936)):
            Circle(SZKIC1_R_4)
        with Locations((-223.024834581, -263.802212936)):
            Circle(SZKIC1_R_3, mode=Mode.SUBTRACT)
    extrude(amount=-DODANIE_WYCI_GNI_CIE1_7_DEPTH)


with BuildPart() as body_8:
    # Szkic1 → Dodanie-wyci_gni_cie1 8 (new body)
    with BuildSketch(Plane(origin=(0, 700, 0), x_dir=(1, 0, 0), z_dir=(0, 1, 0))):
        with Locations((-154.344703344, -260.643821632)):
            Circle(SZKIC1_R_4)
        with Locations((-154.344703344, -260.643821632)):
            Circle(SZKIC1_R_3, mode=Mode.SUBTRACT)
    extrude(amount=-DODANIE_WYCI_GNI_CIE1_8_DEPTH)


with BuildPart() as body_9:
    # Szkic1 → Dodanie-wyci_gni_cie1 9 (new body)
    with BuildSketch(Plane(origin=(0, 700, 0), x_dir=(1, 0, 0), z_dir=(0, 1, 0))):
        with Locations((-94.909521544, -263.802212936)):
            Circle(SZKIC1_R_4)
        with Locations((-94.909521544, -263.802212936)):
            Circle(SZKIC1_R_3, mode=Mode.SUBTRACT)
    extrude(amount=-DODANIE_WYCI_GNI_CIE1_9_DEPTH)


with BuildPart() as body_10:
    # Szkic2 → Dodanie-wyciągnięcie2 (new body)
    with BuildSketch(Plane(origin=(0, 310.2, 0), x_dir=(1, 0, 0), z_dir=(0, 1, 0))):
        with Locations((-370.956911026, -335.367132453)):
            Circle(SZKIC2_R)
        with Locations((-370.956911026, -335.367132453)):
            Circle(SZKIC2_R_2, mode=Mode.SUBTRACT)
    extrude(amount=-DODANIE_WYCI_GNI_CIE2_DEPTH)


with BuildPart() as body_11:
    # Szkic2 → Dodanie-wyci_gni_cie2 2 (new body)
    with BuildSketch(Plane(origin=(0, 310.2, 0), x_dir=(1, 0, 0), z_dir=(0, 1, 0))):
        with Locations((-339.082998521, -305.429754446)):
            Circle(SZKIC2_R)
        with Locations((-339.082998521, -305.429754446)):
            Circle(SZKIC2_R_2, mode=Mode.SUBTRACT)
    extrude(amount=-DODANIE_WYCI_GNI_CIE2_2_DEPTH)


with BuildPart() as body_12:
    # Szkic2 → Dodanie-wyci_gni_cie2 3 (new body)
    with BuildSketch(Plane(origin=(0, 310.2, 0), x_dir=(1, 0, 0), z_dir=(0, 1, 0))):
        with Locations((-289.68705591, -282.424125213)):
            Circle(SZKIC2_R_3)
        with Locations((-289.68705591, -282.424125213)):
            Circle(SZKIC2_R_2, mode=Mode.SUBTRACT)
    extrude(amount=-DODANIE_WYCI_GNI_CIE2_3_DEPTH)


solid = Compound([part.part, body_2.part, body_3.part, body_4.part, body_5.part, body_6.part, body_7.part, body_8.part, body_9.part, body_10.part, body_11.part, body_12.part])
